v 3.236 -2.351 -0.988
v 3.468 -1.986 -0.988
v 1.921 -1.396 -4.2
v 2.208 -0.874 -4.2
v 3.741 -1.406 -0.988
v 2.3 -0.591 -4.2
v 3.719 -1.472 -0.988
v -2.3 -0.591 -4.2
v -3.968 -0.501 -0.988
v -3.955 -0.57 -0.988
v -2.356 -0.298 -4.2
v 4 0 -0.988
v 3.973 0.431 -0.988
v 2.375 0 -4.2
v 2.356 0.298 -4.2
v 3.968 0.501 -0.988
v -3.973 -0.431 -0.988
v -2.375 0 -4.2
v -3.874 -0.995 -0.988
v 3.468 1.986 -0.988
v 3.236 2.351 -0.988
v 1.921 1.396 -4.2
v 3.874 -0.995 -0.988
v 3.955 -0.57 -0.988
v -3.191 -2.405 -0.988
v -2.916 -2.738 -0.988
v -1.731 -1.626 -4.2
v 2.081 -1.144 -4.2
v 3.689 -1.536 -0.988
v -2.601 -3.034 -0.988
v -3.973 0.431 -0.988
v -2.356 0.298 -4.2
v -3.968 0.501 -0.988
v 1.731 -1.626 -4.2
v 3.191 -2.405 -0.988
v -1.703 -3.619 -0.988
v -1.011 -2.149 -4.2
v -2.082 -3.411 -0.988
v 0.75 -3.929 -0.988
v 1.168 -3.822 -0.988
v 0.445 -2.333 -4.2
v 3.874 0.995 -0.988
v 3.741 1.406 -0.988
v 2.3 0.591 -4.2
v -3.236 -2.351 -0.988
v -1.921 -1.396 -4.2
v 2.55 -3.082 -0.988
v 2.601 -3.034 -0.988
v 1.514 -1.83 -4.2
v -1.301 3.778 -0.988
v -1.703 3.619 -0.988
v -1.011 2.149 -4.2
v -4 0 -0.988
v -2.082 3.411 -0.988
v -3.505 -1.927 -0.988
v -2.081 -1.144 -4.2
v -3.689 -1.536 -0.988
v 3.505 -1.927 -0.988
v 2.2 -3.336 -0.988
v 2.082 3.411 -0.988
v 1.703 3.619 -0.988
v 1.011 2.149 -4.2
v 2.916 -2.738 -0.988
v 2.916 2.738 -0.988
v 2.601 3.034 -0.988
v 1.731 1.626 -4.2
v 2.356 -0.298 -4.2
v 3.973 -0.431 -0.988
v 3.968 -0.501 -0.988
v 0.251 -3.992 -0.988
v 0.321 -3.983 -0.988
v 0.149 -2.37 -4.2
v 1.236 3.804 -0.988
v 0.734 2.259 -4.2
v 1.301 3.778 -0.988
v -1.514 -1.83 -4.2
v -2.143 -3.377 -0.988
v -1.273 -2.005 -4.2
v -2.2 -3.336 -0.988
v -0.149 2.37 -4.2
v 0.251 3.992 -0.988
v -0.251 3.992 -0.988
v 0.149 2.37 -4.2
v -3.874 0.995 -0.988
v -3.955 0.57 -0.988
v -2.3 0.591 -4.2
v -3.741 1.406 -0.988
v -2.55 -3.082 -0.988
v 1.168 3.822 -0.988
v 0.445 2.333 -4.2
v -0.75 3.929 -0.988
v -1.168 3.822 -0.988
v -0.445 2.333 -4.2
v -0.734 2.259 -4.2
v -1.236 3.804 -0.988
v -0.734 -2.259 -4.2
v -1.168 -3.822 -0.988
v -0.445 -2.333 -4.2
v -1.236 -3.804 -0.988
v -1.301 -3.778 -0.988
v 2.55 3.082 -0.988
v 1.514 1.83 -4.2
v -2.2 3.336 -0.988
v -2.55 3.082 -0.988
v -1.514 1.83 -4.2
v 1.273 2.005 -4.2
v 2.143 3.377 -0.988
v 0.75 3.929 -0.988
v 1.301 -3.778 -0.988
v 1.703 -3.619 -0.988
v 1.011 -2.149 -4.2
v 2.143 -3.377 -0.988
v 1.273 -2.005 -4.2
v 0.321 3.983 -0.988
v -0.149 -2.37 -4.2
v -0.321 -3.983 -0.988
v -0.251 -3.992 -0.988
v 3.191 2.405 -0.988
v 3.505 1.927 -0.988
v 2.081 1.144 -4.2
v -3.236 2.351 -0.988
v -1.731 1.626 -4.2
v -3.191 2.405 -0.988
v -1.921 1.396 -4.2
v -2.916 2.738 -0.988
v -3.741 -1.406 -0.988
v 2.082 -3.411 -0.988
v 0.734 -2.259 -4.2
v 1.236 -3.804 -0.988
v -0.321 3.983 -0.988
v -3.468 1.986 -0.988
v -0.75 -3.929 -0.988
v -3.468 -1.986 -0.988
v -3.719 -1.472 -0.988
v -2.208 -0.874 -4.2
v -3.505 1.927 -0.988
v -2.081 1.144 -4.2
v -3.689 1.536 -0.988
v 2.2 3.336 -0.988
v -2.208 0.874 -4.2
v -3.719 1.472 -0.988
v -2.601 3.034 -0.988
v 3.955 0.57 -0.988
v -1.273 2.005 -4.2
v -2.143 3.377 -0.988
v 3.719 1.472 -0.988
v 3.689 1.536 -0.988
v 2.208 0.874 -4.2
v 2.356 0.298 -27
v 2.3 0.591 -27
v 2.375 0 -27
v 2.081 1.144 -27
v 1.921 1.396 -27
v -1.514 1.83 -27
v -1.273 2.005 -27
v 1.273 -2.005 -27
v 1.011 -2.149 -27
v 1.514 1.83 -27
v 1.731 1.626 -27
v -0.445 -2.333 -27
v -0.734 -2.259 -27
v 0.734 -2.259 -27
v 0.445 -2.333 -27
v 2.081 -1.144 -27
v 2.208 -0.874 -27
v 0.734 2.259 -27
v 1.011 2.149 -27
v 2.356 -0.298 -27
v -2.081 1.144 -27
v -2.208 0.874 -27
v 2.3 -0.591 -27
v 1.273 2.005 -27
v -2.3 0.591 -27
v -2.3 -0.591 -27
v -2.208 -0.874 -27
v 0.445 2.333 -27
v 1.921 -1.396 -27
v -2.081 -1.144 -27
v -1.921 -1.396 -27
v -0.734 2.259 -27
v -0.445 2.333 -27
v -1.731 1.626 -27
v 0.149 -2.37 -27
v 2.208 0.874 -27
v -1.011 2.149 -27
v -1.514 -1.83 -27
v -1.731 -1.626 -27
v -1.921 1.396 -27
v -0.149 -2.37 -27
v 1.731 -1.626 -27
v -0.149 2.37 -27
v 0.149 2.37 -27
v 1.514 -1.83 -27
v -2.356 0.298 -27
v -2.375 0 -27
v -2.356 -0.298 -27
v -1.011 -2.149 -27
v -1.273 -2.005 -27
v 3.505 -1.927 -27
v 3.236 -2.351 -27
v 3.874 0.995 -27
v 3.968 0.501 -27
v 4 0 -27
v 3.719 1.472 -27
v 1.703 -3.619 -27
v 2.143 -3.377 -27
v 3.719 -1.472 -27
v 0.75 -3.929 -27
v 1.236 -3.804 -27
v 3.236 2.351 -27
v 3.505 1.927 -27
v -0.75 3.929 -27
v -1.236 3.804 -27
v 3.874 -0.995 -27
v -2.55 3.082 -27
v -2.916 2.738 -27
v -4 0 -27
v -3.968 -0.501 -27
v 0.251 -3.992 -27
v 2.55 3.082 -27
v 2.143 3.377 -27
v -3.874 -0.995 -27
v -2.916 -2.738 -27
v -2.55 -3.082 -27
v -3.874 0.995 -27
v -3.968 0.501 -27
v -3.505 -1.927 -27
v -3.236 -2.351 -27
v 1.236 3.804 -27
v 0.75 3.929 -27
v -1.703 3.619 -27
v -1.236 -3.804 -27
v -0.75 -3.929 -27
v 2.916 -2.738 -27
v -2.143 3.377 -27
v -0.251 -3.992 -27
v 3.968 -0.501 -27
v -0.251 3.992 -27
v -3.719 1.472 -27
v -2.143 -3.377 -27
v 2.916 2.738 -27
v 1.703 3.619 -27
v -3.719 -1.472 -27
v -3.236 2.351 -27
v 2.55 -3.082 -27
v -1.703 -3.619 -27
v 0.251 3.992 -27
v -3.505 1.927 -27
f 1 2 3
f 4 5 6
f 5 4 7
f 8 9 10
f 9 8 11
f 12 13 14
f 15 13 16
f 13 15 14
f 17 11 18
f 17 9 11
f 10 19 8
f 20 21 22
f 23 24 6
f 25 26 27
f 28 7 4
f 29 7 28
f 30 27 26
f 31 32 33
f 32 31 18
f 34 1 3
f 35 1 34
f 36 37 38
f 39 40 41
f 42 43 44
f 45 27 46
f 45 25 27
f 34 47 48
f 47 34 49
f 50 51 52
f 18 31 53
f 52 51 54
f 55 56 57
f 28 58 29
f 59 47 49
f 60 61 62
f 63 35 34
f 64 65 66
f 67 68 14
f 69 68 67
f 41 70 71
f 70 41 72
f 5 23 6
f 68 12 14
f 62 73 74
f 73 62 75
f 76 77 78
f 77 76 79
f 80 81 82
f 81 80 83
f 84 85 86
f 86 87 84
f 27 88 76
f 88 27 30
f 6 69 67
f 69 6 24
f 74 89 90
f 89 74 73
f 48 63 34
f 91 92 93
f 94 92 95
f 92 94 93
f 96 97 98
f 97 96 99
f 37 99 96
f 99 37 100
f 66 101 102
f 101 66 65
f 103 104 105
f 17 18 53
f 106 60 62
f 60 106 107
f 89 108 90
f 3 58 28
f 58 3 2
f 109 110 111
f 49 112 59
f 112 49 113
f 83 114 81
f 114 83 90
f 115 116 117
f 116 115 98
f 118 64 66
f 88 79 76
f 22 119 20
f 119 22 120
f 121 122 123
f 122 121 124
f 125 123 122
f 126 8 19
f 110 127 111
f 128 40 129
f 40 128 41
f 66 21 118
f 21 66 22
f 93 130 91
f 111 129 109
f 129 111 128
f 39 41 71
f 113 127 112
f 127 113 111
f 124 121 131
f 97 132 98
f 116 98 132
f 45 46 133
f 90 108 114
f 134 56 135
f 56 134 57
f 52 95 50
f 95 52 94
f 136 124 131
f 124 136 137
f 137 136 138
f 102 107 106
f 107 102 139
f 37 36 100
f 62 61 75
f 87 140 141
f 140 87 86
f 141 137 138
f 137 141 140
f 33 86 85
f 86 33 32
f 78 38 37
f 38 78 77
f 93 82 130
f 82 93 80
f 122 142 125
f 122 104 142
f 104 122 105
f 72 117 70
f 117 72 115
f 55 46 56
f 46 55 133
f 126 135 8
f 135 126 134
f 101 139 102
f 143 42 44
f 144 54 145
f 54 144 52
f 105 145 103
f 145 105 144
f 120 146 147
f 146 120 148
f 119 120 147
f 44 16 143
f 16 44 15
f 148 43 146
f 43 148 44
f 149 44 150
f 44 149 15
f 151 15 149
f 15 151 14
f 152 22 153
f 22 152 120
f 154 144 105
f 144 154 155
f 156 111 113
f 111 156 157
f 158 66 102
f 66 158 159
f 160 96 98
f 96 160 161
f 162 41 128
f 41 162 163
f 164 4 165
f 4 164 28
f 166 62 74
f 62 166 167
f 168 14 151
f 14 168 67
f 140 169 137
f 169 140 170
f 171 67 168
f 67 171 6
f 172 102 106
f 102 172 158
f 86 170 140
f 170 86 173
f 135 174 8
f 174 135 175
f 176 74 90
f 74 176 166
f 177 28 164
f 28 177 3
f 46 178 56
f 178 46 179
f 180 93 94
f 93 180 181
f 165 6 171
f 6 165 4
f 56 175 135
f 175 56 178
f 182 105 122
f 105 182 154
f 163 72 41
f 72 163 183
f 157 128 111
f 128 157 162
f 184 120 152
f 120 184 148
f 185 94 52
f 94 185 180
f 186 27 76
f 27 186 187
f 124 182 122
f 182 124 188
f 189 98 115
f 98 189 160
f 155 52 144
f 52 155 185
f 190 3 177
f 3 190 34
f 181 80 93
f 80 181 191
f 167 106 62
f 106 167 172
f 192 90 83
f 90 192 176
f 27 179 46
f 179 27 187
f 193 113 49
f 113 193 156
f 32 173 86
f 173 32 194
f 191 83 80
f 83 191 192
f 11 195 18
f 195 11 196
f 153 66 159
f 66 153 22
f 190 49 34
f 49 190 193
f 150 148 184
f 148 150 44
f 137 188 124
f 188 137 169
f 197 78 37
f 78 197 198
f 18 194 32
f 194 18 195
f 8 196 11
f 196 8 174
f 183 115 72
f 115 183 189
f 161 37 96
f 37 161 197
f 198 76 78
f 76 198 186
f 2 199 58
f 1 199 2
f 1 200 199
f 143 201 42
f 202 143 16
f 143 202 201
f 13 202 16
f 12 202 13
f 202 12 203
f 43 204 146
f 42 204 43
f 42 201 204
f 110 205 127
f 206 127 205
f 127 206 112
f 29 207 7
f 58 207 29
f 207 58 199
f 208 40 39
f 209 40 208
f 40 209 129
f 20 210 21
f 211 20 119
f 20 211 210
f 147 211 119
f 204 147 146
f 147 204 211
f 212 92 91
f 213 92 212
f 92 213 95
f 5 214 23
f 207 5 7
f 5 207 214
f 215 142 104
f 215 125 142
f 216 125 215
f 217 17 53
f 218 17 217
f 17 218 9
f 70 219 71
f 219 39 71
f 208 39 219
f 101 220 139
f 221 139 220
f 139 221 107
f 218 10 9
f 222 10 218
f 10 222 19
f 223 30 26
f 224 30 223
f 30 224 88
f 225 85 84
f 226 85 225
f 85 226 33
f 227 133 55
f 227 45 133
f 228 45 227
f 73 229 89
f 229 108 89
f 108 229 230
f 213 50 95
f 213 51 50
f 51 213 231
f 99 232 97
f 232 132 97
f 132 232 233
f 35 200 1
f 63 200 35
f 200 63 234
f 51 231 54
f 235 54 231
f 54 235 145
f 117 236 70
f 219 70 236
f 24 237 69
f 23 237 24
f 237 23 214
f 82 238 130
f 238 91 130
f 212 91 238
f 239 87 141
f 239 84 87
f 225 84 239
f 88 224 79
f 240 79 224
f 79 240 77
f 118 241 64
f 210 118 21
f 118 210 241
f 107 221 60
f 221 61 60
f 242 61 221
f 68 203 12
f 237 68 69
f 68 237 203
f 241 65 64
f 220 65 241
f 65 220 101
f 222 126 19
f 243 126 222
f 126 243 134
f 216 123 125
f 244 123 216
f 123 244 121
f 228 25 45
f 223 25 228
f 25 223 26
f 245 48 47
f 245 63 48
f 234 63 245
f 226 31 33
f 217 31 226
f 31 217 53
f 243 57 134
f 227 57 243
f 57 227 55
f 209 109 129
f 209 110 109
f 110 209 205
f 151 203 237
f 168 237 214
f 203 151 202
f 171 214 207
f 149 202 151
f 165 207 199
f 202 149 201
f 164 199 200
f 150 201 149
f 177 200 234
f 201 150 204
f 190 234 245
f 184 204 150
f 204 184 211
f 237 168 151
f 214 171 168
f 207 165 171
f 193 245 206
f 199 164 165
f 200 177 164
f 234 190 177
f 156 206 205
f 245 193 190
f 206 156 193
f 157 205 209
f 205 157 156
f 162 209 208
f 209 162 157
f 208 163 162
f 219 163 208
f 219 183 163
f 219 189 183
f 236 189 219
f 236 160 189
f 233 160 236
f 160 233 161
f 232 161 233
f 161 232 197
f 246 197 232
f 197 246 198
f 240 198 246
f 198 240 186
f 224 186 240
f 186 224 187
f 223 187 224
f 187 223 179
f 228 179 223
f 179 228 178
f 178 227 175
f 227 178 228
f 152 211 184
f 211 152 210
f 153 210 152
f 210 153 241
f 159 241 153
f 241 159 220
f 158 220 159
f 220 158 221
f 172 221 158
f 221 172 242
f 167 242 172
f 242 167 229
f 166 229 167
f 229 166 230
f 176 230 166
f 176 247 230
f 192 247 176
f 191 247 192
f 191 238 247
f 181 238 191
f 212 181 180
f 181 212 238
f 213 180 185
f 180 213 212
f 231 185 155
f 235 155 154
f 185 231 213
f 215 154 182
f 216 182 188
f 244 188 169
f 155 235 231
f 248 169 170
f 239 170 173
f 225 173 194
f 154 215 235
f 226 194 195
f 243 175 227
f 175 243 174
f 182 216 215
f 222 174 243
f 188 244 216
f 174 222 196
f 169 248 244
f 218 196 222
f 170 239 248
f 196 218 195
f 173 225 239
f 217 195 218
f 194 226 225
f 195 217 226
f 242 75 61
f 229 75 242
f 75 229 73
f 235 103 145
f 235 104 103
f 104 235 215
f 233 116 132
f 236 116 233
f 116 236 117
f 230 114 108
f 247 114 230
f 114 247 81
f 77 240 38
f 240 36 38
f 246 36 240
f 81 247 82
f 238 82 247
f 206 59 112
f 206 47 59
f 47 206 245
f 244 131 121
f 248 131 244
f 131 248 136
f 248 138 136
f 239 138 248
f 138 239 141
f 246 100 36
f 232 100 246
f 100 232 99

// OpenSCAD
$fn = 50;

difference() {
	union() {
		translate(v = [0, 0, -27.0]) {
			cylinder(h = 30, r = 4.0);
		}
	}
	union() {
		translate(v = [0, 0, 0]) {
			rotate(a = [0, 0, 0]) {
				difference() {
					union() {
						translate(v = [0, 0, -30.0]) {
							cylinder(h = 30, r = 2.25);
						}
						translate(v = [0, 0, -4.2]) {
							cylinder(h = 4.2, r1 = 2.375, r2 = 4.5);
						}
						translate(v = [0, 0, -30.0]) {
							cylinder(h = 30, r = 2.375);
						}
						translate(v = [0, 0, -30.0]) {
							cylinder(h = 30, r = 2.25);
						}
					}
					union();
				}
			}
		}
		#cylinder(h = 3, r = 5.0);
	}
}
